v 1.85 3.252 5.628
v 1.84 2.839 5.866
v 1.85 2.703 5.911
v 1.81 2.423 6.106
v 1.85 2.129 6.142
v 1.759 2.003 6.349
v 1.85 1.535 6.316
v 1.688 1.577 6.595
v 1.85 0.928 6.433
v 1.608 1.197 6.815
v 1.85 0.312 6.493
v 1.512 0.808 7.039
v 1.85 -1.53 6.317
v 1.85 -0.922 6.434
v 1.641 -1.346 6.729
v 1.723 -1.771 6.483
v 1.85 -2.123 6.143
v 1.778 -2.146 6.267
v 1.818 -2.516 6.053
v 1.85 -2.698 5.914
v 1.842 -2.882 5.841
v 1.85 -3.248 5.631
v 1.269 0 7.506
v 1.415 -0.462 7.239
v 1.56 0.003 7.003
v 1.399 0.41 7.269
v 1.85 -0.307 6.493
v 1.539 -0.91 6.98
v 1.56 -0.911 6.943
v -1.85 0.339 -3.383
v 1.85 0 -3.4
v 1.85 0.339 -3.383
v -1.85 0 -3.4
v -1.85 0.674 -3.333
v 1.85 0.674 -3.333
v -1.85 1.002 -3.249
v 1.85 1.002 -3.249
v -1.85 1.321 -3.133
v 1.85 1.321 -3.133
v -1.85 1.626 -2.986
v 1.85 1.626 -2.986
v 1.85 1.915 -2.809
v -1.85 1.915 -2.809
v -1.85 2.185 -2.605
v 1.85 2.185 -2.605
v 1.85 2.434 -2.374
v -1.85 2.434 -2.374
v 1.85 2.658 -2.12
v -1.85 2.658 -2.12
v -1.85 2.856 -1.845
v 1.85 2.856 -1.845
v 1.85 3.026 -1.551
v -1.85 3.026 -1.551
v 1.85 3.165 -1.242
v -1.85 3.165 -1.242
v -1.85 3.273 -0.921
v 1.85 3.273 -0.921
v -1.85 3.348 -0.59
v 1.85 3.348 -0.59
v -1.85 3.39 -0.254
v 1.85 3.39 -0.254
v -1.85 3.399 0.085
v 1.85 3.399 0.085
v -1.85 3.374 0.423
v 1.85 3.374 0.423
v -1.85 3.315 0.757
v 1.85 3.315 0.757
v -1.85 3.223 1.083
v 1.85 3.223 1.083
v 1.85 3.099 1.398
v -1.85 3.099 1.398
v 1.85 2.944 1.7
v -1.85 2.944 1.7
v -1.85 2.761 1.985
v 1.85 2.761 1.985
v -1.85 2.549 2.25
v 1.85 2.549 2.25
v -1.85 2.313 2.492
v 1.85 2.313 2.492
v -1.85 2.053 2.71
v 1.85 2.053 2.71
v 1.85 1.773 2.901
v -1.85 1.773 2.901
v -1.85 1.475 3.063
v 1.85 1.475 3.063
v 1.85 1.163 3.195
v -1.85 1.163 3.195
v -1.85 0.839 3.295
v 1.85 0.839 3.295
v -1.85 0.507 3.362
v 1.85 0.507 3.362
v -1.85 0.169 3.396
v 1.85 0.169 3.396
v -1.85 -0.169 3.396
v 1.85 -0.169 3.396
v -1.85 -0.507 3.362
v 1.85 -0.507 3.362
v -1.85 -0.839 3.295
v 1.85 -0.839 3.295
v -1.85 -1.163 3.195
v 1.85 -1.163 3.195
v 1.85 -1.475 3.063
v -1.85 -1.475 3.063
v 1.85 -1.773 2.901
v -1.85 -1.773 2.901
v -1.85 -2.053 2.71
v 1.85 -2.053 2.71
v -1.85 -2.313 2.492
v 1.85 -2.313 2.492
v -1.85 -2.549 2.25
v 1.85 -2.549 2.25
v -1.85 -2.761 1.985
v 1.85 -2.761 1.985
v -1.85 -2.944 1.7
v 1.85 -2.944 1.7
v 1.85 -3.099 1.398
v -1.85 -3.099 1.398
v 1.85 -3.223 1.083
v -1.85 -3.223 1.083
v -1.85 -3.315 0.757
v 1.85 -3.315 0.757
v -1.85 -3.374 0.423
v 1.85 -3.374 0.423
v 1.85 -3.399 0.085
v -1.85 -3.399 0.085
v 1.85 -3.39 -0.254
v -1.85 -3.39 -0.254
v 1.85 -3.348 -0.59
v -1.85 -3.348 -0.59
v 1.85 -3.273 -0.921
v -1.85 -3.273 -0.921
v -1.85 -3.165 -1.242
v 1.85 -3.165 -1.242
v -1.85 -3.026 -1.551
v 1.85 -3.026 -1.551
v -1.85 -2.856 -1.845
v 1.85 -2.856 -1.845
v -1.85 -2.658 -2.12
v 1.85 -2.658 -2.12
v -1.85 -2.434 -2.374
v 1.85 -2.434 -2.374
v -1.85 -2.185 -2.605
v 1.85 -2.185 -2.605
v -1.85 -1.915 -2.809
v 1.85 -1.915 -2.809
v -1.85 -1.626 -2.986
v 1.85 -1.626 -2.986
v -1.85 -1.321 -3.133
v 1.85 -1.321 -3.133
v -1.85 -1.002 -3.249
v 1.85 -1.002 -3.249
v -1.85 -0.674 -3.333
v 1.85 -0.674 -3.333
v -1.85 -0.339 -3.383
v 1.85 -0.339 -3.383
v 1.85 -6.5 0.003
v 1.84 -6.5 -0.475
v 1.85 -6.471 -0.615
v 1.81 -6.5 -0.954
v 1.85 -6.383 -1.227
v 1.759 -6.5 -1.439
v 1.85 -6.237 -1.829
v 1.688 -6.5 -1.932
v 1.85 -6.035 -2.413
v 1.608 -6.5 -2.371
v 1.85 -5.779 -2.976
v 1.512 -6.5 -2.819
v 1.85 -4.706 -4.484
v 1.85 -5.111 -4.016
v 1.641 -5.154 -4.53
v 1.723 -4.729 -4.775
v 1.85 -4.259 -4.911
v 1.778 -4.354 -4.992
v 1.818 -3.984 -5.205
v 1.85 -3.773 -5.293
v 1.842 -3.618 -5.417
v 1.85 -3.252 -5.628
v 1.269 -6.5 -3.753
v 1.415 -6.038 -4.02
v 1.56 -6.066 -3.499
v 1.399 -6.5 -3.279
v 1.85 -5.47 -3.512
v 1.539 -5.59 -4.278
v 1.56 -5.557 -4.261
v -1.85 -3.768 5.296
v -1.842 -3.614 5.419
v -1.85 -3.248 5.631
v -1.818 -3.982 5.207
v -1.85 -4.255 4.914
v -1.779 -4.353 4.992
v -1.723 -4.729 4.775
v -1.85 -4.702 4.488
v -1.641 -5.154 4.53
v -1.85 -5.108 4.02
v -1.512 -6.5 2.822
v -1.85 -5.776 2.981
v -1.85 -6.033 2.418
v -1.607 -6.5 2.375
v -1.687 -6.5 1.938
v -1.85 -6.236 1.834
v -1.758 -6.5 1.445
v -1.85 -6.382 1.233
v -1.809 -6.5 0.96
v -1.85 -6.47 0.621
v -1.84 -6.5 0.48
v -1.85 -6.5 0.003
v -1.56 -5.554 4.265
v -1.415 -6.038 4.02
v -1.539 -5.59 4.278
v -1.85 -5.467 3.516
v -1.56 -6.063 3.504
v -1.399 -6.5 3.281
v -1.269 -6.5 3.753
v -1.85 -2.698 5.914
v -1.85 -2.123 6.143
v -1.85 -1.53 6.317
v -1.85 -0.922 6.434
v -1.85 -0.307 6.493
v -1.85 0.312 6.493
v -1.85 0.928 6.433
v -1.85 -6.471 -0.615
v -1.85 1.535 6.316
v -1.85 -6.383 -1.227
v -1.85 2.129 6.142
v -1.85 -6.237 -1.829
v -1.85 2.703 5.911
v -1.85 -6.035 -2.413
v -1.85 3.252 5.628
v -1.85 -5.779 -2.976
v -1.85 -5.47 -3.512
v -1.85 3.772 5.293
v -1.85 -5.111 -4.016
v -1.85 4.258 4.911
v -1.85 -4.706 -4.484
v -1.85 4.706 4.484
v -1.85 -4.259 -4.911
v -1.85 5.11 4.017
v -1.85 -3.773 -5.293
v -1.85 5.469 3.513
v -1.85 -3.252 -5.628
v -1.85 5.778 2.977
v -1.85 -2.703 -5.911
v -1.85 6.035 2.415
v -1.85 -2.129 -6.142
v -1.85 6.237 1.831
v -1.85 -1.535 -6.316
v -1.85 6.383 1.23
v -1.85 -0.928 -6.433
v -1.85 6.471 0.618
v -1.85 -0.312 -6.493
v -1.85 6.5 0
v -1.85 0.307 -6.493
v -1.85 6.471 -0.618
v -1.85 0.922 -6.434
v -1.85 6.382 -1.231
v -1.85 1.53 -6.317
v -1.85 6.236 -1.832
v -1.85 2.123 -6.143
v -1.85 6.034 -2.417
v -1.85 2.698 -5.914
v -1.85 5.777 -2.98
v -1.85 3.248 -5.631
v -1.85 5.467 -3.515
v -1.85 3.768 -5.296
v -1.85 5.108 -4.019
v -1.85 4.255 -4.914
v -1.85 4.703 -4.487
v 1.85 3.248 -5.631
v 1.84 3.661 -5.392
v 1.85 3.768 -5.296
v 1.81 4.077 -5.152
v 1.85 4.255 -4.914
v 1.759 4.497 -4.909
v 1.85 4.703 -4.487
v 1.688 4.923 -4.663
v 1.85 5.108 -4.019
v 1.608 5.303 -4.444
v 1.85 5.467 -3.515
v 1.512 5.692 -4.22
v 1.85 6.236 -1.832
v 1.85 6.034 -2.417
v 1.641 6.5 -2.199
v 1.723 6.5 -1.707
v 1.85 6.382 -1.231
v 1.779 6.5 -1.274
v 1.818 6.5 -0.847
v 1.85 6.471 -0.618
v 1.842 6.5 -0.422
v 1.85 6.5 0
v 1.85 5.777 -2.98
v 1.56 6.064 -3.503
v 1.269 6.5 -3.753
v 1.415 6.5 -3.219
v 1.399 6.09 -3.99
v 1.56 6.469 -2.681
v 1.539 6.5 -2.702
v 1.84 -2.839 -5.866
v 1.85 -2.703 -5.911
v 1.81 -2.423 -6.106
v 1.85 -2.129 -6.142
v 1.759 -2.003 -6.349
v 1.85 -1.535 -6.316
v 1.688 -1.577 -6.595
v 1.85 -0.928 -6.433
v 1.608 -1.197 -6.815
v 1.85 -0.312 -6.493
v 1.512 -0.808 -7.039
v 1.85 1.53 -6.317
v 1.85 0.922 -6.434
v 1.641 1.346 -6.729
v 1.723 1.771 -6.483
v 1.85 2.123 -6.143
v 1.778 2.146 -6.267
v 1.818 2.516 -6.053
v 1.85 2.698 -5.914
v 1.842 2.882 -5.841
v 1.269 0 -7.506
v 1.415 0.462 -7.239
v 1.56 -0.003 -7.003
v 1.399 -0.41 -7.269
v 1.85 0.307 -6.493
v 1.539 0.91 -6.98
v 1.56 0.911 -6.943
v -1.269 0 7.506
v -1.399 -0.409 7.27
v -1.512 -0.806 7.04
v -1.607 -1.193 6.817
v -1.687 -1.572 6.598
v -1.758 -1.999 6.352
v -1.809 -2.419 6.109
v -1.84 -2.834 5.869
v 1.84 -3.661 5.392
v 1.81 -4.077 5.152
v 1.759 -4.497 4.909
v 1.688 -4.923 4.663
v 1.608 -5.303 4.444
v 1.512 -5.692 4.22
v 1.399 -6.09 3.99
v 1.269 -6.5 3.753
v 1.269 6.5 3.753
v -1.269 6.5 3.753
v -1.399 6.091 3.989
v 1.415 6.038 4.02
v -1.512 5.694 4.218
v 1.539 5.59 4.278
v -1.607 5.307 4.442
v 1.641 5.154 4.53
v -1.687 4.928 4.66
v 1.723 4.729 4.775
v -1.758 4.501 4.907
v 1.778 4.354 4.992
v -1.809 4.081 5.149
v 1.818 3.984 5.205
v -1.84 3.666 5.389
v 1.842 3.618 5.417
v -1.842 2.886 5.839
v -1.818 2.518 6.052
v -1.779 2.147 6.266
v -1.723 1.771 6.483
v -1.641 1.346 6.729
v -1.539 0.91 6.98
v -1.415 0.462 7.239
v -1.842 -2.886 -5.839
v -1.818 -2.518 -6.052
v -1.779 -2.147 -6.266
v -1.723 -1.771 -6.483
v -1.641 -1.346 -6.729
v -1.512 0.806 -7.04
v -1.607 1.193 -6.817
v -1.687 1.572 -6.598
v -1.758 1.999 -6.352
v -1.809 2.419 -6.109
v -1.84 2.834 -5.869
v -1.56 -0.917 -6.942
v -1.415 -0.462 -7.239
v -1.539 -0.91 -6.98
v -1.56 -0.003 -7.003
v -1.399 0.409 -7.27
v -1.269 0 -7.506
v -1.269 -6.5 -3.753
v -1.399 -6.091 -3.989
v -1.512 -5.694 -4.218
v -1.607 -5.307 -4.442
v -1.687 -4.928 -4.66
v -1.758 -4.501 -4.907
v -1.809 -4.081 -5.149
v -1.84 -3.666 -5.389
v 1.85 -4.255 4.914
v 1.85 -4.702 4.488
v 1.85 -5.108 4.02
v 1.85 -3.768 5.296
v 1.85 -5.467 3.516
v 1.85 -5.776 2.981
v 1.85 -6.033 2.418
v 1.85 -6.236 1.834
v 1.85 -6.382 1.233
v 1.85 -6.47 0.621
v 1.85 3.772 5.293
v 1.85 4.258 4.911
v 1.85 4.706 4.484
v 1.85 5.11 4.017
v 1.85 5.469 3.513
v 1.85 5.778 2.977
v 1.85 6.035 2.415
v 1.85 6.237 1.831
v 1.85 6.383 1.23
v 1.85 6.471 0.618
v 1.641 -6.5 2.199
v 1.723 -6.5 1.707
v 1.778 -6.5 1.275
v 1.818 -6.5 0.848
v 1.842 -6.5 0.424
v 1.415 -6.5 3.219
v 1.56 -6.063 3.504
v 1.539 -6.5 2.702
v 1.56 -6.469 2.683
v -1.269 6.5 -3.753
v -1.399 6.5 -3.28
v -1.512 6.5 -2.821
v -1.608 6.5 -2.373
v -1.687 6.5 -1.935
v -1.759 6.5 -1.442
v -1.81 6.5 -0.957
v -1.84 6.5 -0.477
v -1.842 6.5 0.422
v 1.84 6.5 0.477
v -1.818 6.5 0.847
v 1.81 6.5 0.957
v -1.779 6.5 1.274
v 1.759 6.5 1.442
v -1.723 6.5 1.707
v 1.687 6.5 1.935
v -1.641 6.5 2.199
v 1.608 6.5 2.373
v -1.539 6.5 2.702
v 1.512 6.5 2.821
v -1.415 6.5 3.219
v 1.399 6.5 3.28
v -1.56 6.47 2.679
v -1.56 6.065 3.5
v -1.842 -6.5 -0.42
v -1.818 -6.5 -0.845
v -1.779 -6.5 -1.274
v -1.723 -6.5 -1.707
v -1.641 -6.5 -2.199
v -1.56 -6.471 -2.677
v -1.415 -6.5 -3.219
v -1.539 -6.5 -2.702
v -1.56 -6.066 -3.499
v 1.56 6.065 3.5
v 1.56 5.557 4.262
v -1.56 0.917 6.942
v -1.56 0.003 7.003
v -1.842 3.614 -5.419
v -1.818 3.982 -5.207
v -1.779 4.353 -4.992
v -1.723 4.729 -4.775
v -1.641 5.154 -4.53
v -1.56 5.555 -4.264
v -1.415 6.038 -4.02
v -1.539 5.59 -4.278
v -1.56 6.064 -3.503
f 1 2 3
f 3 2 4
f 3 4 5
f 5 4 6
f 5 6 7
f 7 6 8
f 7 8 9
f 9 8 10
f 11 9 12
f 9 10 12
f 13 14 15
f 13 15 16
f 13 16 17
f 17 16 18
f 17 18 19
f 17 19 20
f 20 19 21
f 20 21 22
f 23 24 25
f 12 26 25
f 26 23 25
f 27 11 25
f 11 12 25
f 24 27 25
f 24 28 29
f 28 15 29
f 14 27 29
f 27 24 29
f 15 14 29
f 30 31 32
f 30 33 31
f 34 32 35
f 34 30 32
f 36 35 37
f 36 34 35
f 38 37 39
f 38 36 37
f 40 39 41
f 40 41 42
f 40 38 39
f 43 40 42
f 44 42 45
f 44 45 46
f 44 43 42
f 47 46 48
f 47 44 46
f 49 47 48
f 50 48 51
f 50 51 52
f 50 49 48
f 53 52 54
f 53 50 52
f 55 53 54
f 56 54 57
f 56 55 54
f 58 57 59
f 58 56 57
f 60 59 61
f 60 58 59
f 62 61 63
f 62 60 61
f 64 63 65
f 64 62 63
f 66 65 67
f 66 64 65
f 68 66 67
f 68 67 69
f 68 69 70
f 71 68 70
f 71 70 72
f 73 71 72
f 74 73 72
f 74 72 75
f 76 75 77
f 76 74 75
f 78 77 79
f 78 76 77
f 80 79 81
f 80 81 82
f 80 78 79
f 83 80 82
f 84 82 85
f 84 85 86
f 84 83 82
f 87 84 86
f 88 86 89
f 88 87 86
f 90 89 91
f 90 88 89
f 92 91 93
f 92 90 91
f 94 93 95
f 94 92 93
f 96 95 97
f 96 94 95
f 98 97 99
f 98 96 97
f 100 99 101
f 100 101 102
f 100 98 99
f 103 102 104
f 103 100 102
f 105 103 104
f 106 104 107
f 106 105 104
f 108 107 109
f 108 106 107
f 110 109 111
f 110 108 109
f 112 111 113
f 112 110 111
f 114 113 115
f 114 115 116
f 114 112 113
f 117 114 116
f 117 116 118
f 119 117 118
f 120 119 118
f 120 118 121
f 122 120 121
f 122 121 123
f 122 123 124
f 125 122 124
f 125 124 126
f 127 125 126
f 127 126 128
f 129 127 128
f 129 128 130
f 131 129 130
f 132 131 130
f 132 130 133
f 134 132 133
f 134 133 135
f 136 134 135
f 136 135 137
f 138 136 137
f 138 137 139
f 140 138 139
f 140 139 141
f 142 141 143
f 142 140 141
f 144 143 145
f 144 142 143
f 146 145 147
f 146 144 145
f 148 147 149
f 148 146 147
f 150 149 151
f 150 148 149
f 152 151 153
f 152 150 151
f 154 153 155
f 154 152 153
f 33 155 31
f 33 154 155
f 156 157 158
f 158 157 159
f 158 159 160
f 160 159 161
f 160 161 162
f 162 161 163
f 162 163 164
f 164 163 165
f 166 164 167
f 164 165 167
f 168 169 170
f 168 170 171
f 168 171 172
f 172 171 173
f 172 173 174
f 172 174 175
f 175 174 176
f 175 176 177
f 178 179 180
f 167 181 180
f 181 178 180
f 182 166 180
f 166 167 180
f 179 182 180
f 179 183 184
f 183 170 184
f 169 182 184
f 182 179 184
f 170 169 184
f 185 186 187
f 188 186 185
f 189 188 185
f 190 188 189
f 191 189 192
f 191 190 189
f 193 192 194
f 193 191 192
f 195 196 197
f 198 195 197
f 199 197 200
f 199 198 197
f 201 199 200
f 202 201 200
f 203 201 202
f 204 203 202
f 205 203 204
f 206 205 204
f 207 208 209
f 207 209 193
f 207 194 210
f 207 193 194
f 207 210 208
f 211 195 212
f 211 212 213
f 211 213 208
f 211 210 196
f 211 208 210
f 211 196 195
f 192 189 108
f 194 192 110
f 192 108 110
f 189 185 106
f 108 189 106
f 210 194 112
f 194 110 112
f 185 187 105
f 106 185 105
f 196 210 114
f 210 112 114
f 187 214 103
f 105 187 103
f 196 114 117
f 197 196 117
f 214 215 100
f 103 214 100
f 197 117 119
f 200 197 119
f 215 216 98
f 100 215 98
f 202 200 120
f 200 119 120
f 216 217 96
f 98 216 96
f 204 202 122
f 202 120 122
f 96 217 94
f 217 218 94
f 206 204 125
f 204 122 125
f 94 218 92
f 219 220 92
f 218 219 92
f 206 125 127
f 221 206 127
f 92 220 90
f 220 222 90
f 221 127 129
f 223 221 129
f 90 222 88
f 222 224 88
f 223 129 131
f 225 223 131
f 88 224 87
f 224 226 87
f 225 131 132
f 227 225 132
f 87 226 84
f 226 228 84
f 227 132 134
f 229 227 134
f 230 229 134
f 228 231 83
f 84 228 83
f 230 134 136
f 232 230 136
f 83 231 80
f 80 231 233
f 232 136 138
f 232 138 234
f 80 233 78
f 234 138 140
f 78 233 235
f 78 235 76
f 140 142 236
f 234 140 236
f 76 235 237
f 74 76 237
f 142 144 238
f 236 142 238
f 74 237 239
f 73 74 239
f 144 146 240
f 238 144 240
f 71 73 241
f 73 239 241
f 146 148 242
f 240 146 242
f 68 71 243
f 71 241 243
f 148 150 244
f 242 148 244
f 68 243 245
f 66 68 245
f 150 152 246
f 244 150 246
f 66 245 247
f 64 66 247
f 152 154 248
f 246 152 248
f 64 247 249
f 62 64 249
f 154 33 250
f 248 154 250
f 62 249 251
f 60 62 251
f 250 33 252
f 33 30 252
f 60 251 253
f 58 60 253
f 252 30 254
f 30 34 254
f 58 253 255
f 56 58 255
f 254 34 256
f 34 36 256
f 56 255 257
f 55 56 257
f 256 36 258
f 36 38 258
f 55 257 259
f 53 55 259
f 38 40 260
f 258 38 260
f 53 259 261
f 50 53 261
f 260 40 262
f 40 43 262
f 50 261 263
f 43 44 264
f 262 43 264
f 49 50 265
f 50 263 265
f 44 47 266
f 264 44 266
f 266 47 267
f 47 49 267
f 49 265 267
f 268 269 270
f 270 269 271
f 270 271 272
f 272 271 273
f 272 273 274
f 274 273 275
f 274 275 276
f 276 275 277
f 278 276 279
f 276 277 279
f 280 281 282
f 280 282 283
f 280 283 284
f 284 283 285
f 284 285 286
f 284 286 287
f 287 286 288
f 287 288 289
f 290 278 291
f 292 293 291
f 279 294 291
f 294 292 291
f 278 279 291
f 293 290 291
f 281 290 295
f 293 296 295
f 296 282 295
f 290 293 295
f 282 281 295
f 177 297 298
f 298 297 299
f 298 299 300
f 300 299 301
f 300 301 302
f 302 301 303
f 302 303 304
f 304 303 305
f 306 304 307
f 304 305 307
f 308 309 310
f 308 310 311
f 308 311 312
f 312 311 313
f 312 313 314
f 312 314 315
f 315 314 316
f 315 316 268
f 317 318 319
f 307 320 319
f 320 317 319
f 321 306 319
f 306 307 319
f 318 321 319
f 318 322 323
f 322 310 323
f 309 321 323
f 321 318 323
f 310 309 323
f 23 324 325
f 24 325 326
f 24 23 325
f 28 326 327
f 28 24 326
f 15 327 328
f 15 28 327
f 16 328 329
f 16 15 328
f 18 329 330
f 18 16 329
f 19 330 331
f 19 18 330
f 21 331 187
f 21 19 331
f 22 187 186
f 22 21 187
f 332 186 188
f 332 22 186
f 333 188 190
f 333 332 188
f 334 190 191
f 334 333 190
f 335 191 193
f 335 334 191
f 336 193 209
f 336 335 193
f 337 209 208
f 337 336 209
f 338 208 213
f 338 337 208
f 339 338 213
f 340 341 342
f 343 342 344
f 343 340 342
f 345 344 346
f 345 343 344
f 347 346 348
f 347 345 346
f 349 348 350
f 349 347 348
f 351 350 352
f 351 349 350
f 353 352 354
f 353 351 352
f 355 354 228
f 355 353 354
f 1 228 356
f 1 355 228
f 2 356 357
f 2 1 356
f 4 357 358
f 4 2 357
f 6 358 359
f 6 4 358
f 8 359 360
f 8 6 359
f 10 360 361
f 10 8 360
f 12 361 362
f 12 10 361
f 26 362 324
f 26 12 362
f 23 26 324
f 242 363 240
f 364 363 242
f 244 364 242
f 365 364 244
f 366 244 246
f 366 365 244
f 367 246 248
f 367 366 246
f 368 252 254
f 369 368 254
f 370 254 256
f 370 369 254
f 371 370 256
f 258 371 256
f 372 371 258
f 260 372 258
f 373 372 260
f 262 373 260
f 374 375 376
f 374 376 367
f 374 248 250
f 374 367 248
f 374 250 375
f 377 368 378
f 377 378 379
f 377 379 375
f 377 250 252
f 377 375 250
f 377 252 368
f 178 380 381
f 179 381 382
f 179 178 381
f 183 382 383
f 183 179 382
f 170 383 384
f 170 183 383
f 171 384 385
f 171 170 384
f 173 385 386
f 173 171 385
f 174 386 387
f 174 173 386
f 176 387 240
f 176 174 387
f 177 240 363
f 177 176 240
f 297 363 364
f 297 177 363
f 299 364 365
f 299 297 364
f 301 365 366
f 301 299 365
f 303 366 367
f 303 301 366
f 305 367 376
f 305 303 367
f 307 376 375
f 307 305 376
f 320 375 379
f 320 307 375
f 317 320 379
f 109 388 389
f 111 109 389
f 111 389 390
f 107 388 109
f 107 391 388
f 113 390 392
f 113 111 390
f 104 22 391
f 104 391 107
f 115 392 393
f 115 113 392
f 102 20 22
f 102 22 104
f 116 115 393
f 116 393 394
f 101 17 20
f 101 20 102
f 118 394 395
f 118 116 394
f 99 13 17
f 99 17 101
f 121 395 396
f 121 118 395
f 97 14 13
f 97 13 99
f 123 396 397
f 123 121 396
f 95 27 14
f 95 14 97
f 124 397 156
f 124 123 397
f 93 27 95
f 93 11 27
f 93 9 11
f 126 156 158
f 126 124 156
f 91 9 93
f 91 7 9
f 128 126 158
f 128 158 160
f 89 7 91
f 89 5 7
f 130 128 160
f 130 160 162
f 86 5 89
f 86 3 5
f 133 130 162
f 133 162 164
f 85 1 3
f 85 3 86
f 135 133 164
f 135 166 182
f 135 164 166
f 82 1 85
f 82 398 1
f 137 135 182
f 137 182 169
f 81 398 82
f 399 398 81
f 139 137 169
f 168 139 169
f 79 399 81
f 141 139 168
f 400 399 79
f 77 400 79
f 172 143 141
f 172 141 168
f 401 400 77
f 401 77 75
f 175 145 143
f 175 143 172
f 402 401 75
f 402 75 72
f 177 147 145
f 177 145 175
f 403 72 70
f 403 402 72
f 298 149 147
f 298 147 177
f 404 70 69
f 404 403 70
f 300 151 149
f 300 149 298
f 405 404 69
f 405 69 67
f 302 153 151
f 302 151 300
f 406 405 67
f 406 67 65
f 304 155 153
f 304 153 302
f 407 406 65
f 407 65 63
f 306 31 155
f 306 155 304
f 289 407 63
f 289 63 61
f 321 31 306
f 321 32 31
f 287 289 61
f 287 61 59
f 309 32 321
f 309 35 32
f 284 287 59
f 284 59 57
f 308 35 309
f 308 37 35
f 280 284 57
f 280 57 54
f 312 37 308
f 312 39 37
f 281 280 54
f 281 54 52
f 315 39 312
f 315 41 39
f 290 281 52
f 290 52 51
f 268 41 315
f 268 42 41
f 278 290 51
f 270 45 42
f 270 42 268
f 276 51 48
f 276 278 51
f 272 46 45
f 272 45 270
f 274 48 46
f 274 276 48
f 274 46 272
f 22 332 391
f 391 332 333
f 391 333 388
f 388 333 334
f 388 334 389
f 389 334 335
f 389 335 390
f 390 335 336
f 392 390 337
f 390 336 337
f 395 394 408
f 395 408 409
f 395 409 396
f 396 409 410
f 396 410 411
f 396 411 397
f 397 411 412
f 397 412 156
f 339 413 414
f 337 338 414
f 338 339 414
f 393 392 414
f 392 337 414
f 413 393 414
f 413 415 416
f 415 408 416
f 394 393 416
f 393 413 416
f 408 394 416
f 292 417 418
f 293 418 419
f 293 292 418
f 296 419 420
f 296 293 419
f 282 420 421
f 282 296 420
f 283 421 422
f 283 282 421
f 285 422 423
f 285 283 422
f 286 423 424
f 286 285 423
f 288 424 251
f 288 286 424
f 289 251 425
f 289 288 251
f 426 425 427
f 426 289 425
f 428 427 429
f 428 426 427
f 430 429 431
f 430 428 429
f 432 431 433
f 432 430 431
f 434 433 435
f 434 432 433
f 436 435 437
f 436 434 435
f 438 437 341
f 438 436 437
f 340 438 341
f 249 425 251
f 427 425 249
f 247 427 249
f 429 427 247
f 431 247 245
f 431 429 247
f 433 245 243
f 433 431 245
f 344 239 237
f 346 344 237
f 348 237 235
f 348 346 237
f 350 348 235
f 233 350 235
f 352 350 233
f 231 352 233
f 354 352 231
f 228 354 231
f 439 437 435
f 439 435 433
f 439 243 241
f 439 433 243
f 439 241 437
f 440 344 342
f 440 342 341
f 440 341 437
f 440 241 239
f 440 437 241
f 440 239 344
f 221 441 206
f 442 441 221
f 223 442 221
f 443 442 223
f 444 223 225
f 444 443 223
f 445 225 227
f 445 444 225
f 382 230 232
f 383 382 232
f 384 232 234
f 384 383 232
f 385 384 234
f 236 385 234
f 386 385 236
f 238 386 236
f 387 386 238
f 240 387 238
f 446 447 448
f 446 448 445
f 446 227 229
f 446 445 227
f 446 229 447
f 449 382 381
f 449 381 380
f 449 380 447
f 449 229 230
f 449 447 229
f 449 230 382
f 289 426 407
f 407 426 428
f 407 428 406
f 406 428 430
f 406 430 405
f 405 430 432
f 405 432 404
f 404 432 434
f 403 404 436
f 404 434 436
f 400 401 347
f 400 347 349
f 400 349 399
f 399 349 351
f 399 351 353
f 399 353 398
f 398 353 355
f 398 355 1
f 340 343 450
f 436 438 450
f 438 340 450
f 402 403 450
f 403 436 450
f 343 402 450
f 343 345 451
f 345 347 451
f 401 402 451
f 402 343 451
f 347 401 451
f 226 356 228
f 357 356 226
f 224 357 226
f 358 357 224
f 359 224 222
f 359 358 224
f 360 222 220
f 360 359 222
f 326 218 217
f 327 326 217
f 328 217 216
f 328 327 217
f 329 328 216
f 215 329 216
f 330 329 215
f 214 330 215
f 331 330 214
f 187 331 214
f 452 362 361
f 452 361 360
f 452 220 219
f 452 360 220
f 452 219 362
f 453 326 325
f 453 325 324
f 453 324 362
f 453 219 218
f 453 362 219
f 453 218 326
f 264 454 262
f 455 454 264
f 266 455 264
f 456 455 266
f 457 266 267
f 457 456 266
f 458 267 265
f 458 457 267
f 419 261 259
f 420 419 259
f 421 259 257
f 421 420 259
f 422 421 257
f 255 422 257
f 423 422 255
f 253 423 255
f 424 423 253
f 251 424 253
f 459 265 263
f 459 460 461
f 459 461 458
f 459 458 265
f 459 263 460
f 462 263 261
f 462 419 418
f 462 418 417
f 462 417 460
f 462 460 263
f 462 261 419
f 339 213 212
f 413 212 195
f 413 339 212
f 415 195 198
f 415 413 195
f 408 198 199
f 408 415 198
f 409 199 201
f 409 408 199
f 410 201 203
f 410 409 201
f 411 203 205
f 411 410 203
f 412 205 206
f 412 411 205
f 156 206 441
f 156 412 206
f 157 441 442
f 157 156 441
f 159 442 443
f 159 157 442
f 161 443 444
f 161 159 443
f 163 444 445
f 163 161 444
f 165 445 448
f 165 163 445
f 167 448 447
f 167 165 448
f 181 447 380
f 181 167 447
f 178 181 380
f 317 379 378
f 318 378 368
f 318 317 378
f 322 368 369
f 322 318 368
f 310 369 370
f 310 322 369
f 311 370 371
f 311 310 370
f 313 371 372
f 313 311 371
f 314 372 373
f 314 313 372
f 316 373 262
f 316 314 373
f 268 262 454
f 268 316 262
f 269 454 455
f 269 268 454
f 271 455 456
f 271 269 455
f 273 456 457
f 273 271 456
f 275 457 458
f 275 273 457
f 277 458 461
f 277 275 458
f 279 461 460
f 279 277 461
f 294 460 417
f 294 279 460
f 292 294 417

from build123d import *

# Parameters (mm, degrees)
SKETCH1_R      = 3.4
EXTRUDE1_DEPTH = 1.85


# Read off the part's stored shape, not the designer's step: Cut-Extrude1
with BuildPart() as part:
    # Sketch1 → Extrude1 (new, symmetric)
    with BuildSketch(Plane(origin=(0, 0, 0), x_dir=(0, 0, -1), z_dir=(1, 0, 0))):
        Polygon((7.505553499, 0), (3.75277675, 6.5), (-3.75277675, 6.5), (-7.505553499, 0), (-3.75277675, -6.5), (3.75277675, -6.5), align=None)
        Circle(SKETCH1_R, mode=Mode.SUBTRACT)
    extrude(amount=EXTRUDE1_DEPTH, both=True)

    # Cut-Extrude1 outline → Cut-Extrude1 (revolve, cut)
    with BuildSketch(Plane.YX):
        Polygon((7.505553503, 1.850001347), (6.499998254, 1.850001347), (7.505553503, 1.269443414), align=None)
    cut_extrude1 = revolve(axis=Axis((0, 0, 0), (1, 0, 0)), mode=Mode.SUBTRACT)

    # Mirror1: Cut-Extrude1 across plane
    add(cut_extrude1.mirror(Plane(origin=(0, 0, 0), x_dir=(0, 0, 1), z_dir=(1, 0, 0))), mode=Mode.SUBTRACT)


solid = part.part
